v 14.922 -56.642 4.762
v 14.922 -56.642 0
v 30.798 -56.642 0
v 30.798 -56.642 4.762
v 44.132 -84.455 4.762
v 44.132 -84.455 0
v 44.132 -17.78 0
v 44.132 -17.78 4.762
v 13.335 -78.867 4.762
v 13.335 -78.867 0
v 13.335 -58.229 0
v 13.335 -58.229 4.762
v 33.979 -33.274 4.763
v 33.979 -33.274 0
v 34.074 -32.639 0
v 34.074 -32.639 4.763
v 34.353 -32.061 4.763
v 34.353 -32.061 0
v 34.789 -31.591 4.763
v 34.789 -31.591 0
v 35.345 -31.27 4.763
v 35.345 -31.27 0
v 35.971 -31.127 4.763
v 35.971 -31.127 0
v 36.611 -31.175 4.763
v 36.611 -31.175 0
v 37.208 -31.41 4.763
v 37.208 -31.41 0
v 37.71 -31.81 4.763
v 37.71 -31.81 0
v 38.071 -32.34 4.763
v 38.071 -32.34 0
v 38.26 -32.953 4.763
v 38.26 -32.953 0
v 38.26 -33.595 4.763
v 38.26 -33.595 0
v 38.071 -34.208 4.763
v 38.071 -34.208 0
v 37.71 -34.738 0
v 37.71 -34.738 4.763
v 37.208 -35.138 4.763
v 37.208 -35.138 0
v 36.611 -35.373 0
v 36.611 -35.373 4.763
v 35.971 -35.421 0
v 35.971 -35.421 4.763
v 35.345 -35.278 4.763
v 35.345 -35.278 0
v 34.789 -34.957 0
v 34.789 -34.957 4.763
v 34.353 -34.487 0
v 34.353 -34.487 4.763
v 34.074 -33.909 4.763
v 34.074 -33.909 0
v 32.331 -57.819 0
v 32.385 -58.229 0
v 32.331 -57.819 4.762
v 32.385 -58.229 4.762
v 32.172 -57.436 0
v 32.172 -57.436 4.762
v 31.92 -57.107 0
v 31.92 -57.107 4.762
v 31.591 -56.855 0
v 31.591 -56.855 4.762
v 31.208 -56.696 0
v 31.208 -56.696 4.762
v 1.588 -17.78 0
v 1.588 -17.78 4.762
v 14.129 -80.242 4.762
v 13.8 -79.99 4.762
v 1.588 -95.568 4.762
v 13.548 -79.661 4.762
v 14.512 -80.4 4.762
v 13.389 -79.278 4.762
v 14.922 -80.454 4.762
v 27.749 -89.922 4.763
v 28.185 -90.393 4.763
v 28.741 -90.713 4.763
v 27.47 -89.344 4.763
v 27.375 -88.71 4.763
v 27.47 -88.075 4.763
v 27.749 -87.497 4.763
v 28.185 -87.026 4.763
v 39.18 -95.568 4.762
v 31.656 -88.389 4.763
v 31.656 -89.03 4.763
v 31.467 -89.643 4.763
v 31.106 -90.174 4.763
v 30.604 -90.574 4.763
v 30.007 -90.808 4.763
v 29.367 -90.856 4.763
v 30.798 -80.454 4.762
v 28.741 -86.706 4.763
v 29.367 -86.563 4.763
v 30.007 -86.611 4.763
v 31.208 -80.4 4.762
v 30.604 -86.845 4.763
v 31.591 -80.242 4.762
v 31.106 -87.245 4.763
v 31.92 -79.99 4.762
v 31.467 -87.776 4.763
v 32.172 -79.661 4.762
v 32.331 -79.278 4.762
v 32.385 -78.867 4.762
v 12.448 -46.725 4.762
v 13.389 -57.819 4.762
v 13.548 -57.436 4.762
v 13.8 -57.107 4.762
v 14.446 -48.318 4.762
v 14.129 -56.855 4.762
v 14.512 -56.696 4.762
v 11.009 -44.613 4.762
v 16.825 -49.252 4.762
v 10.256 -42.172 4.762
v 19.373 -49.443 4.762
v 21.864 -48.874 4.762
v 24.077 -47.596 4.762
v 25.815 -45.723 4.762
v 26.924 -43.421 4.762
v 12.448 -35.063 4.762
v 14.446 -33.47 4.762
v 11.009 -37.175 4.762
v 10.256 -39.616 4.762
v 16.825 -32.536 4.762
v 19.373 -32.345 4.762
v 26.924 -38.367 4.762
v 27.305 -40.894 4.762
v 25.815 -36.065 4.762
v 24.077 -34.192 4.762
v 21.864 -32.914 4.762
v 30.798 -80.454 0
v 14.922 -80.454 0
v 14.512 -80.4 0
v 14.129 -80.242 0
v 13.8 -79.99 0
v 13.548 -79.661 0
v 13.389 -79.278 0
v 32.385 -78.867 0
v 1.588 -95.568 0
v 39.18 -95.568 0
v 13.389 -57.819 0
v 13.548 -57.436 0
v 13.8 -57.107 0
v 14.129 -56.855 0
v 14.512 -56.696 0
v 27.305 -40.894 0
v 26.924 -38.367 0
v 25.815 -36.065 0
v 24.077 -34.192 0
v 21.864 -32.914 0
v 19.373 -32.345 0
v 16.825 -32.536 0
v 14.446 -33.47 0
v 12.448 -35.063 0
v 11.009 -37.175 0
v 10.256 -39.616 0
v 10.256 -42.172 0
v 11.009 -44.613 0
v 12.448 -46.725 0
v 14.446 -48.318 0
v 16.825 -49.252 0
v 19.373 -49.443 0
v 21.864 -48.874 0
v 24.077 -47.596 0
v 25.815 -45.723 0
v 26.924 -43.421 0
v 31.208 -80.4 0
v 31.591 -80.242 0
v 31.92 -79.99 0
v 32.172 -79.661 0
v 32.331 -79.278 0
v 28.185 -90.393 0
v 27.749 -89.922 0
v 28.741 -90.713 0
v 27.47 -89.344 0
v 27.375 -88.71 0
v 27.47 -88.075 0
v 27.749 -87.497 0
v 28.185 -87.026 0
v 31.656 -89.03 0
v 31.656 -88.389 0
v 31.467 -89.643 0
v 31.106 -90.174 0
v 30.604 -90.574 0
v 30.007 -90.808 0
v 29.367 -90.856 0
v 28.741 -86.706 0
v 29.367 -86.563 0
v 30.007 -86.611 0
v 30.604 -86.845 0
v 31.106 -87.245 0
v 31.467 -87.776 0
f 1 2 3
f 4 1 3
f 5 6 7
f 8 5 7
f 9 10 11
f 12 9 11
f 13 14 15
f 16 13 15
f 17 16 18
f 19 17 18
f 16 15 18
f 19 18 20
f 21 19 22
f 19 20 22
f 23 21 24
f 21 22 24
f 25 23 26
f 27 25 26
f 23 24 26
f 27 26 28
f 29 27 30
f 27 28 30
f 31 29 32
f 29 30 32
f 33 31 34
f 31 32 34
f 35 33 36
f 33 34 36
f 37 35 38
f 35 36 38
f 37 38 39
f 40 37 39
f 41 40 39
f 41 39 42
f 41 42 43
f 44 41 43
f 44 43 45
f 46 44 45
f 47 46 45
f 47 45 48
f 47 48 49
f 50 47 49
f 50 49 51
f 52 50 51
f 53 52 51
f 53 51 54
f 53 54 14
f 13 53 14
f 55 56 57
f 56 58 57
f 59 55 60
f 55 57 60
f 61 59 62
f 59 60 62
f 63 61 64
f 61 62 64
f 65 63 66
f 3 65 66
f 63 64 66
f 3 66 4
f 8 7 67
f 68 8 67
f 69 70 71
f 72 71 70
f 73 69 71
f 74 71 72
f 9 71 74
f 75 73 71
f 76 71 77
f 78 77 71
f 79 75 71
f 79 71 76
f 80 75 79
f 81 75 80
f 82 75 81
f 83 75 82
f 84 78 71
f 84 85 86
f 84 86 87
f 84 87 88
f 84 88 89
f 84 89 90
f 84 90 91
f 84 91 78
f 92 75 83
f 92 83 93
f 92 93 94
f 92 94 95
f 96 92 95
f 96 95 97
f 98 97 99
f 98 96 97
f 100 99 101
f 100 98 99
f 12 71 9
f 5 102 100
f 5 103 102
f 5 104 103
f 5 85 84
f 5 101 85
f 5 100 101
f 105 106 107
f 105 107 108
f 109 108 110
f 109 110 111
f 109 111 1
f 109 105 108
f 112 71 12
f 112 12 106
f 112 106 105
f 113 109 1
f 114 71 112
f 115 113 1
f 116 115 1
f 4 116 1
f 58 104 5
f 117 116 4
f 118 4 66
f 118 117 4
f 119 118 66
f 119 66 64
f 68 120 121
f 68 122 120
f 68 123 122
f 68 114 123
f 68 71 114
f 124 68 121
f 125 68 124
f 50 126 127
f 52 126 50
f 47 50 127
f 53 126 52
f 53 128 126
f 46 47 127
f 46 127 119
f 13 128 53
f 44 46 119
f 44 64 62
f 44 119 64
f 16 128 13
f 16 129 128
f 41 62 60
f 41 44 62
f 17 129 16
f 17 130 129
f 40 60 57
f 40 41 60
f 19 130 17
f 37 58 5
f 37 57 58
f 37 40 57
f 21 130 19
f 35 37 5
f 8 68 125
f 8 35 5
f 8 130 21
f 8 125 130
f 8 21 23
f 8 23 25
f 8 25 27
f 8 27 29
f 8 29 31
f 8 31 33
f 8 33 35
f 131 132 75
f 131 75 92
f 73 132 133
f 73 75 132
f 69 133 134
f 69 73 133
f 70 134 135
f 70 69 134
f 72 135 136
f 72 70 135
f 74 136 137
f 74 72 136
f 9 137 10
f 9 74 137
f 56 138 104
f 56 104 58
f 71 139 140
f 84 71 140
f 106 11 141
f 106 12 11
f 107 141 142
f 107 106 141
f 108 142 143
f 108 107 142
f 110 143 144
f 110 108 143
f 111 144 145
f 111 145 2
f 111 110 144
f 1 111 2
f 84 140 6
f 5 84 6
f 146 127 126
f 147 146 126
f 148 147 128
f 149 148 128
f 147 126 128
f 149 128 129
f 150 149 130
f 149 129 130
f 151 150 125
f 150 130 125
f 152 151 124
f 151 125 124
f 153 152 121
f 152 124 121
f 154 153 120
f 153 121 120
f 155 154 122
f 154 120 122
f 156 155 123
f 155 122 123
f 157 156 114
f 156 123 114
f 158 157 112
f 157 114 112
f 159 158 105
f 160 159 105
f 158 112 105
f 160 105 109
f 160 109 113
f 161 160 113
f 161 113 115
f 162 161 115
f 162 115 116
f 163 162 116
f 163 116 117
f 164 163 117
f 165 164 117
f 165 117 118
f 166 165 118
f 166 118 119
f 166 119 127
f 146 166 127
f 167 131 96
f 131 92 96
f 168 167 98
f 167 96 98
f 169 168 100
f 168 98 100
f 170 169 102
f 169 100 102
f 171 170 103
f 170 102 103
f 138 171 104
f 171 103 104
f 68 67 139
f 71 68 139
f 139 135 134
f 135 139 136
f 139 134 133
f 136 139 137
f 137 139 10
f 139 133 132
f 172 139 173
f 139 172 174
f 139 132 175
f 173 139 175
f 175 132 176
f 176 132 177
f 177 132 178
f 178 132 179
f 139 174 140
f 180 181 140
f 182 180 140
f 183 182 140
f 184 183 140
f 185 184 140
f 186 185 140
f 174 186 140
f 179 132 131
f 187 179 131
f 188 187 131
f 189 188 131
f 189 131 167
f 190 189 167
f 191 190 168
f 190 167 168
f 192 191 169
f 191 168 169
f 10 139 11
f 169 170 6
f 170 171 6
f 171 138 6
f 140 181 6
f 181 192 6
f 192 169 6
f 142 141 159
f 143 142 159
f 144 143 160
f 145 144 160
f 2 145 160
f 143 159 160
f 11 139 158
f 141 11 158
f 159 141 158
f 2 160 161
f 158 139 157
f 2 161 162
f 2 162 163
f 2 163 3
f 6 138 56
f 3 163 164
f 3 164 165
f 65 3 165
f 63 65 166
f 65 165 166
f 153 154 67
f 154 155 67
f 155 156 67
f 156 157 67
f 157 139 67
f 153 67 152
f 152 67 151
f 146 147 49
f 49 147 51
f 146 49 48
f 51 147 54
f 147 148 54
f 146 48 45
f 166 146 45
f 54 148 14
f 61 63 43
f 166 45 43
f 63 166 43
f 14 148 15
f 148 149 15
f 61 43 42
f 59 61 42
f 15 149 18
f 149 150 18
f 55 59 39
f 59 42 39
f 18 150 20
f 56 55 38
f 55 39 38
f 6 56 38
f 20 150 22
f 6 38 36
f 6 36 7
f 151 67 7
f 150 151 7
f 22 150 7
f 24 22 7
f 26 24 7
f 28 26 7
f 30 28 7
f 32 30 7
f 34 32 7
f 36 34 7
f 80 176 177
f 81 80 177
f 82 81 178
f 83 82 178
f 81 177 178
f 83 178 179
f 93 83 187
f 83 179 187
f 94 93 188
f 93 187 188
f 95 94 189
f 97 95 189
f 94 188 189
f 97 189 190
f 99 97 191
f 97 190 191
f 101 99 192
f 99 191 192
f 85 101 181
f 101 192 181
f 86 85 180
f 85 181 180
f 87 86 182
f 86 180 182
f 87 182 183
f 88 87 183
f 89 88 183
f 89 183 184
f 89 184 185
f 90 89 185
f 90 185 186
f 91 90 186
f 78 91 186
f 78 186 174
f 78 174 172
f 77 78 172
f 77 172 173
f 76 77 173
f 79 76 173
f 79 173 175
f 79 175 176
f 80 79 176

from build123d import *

# Parameters (mm, degrees)
SKETCH1_W             = 19.05
SKETCH1_H             = 23.8125
BOSS_EXTRUDE1_DEPTH   = 4.7625
SKETCH6_R             = 8.5725
CUT_EXTRUDE4_DEPTH    = 5.7625
F_6_CLEARANCE_HOLE1_D = 4.3053
FILLET1_R             = 1.5875


with BuildPart() as part:
    # Sketch1 → Boss-Extrude1 (new body)
    with BuildSketch(Plane.XY):
        Polygon((1.5875, -17.78), (1.5875, -95.5675), (39.1795, -95.5675), (44.1325, -84.455), (44.1325, -17.78), align=None)
        with Locations((22.86, -68.54825)):
            Rectangle(SKETCH1_W, SKETCH1_H, mode=Mode.SUBTRACT)
    extrude(amount=BOSS_EXTRUDE1_DEPTH)

    # Sketch6 → Cut-Extrude4 (cut, through all)
    with BuildSketch(Plane(origin=(156.406140968, -462.385138809, 4.7625), x_dir=(1, 0, 0), z_dir=(0, 0, 1))):
        with Locations((-137.673640968, 421.491138809)):
            Circle(SKETCH6_R)
    extrude(amount=-CUT_EXTRUDE4_DEPTH, mode=Mode.SUBTRACT)

    # #6 Clearance Hole1 (through all)
    with Locations(Plane.XY.offset(4.7625)):
        with Locations((36.1315, -33.274), (29.5275, -88.7095)):
            Hole(F_6_CLEARANCE_HOLE1_D / 2)

    # Fillet1
    fillet1_edges = [part.edges().sort_by_distance(p)[0] for p in [
        (13.335, -80.4545, 2.38125),
        (32.385, -80.4545, 2.38125),
        (32.385, -56.642, 2.38125),
        (13.335, -56.642, 2.38125),
    ]]
    fillet(fillet1_edges, radius=FILLET1_R)


solid = part.part
